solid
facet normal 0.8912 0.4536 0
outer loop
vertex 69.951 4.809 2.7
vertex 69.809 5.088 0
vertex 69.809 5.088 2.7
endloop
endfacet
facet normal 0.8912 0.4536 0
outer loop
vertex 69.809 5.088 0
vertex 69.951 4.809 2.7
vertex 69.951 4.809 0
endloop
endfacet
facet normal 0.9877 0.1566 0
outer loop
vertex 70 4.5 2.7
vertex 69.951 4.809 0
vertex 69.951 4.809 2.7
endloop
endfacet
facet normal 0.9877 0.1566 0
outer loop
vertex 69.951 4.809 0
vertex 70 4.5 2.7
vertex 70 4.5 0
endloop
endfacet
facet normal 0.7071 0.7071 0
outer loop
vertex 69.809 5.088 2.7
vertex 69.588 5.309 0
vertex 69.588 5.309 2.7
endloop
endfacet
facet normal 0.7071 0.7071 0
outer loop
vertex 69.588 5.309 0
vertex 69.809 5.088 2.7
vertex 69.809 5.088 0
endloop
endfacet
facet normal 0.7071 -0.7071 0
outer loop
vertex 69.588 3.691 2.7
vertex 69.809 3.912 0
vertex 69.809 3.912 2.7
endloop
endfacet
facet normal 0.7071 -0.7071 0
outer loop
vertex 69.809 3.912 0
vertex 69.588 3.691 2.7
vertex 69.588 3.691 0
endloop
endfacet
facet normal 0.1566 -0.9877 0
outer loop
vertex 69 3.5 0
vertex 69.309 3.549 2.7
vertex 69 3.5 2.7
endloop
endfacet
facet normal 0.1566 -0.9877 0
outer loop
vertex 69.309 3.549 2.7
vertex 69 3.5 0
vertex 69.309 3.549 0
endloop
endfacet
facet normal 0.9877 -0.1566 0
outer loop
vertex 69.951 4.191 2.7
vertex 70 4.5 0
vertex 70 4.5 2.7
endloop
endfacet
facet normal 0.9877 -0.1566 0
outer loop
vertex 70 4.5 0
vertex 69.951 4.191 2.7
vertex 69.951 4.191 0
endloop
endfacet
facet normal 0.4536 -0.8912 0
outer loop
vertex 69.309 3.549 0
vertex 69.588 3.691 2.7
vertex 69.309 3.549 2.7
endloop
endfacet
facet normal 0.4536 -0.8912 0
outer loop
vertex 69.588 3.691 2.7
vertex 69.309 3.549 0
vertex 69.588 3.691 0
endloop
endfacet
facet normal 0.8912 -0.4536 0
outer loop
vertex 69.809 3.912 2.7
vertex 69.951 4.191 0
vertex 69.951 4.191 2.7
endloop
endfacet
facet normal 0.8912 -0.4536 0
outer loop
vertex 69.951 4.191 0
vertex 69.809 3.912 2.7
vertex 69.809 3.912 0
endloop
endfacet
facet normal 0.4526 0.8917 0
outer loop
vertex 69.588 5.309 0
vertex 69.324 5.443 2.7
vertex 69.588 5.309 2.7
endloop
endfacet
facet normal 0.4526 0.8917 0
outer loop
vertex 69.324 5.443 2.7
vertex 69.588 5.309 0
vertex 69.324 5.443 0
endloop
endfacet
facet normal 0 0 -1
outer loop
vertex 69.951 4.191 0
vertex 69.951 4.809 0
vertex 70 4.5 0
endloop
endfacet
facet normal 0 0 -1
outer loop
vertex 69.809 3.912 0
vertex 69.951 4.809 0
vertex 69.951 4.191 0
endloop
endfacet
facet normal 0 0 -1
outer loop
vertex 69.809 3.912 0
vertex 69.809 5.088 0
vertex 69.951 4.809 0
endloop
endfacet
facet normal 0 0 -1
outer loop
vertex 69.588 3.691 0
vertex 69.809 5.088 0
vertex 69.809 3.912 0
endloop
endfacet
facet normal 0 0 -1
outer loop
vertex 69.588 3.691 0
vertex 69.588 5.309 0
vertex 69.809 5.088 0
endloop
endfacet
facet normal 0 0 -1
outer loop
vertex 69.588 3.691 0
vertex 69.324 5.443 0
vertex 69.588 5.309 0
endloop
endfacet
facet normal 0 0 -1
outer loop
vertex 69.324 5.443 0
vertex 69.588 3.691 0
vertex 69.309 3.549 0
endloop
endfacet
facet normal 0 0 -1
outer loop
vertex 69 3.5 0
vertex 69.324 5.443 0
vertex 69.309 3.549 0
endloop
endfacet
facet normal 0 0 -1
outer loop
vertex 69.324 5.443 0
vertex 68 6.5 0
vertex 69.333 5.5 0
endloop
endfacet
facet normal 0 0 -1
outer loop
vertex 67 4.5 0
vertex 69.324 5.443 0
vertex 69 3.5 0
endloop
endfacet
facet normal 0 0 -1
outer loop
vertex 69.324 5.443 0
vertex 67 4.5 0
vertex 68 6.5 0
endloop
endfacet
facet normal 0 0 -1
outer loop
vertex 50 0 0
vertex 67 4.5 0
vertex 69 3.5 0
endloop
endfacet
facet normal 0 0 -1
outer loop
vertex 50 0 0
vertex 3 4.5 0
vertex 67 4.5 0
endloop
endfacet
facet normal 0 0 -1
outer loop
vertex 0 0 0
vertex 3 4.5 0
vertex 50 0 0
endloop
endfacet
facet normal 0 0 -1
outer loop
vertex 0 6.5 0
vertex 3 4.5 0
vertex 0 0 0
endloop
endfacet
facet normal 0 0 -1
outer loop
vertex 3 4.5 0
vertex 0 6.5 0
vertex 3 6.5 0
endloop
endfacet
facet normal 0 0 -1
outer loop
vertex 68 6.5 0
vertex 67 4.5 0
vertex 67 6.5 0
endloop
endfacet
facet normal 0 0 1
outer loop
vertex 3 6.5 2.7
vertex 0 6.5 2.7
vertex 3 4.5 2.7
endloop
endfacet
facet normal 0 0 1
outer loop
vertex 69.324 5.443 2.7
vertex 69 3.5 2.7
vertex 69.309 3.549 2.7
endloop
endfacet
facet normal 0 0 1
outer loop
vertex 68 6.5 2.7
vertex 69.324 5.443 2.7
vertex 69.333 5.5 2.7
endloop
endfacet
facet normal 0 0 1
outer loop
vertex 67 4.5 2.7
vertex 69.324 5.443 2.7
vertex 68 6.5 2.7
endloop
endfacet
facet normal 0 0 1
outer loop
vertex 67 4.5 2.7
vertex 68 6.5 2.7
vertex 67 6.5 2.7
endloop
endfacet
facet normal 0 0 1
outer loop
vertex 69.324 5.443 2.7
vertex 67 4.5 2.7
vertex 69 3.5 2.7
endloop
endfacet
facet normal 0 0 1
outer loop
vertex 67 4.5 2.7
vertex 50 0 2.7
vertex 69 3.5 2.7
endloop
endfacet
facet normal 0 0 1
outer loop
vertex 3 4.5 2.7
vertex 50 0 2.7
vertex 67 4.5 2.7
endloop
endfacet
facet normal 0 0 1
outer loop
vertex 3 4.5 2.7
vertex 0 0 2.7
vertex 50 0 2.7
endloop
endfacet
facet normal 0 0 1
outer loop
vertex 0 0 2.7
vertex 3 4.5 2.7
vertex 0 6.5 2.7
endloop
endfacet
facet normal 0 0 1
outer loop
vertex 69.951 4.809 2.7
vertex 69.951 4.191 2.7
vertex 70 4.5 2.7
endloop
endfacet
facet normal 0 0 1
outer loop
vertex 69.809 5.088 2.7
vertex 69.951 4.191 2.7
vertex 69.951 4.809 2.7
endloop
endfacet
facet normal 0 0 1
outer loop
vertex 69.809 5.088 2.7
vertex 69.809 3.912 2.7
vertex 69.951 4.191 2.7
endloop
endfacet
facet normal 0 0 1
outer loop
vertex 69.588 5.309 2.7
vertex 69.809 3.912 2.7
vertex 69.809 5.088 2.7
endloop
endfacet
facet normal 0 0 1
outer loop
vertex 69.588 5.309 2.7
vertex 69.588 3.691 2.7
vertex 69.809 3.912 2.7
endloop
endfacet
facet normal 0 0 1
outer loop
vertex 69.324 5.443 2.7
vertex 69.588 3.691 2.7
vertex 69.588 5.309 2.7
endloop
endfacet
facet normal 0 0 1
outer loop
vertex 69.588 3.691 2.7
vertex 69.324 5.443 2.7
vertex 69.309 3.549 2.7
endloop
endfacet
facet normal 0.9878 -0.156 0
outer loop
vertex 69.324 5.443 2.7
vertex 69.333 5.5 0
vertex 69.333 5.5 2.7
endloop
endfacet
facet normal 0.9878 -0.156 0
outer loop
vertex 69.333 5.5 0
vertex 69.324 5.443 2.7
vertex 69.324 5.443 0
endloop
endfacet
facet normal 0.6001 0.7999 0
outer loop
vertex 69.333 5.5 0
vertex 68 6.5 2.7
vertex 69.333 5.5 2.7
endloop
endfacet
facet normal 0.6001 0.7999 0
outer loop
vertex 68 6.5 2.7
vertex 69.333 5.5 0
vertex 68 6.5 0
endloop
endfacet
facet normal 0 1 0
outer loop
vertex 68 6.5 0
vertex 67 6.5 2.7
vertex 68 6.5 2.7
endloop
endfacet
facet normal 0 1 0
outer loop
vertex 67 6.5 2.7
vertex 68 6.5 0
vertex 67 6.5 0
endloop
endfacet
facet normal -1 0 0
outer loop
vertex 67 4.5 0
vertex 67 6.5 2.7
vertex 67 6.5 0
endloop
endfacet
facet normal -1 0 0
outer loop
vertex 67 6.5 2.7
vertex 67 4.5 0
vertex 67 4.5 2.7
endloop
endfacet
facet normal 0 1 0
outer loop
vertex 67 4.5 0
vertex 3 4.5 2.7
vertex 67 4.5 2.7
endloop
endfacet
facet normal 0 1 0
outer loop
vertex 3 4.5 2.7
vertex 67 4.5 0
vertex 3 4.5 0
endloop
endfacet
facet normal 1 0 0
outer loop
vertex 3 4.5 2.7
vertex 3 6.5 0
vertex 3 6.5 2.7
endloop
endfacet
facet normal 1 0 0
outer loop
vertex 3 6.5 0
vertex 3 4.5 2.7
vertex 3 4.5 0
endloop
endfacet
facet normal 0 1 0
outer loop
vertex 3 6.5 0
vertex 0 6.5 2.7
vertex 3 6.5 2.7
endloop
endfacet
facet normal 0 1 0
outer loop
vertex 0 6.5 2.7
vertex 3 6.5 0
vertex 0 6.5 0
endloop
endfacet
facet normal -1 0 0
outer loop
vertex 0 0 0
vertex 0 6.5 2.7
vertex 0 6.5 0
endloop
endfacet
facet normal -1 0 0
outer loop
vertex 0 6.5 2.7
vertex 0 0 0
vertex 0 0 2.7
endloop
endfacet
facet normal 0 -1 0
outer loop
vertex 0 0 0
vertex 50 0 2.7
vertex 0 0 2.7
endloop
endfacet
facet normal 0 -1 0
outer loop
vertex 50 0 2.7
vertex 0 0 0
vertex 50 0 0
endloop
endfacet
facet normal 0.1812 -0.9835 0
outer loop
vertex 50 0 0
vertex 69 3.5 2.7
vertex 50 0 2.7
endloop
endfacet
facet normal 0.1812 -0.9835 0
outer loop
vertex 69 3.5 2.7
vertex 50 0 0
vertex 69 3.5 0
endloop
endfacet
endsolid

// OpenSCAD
il=64;  //internal length
oal=70;w=4.5;t=2.7;
lip=[3,2];  //length,ip
hook=[3,3.5,2];   //length, width, lip
taper=[19,2];   //length, root

//cube([oal-taper.x-hook.x,w,t]); //parallel section
//cube([lip.x,w+lip.y,t]);    //lip
//taper and hook section
translate([il+lip.x+hook.x-taper.y/2,taper.y/2+w-taper.y/2,0])cylinder(h=t,d=taper.y,$fn=20);
path=[[0,0],
[taper.x+hook.x-taper.y/2,w-taper.y],
[taper.x+hook.x-taper.y/2,w],
[taper.x-taper.y/2+1,w+hook.y/2],
[taper.x-taper.y/2,w+hook.y/2],
[taper.x-taper.y/2,w],
[0,w]
];
path2=[
[0,0],
[0,w+lip.y],
[lip.x,w+lip.y],
[lip.x,w],
[lip.x+il,w],
[lip.x+il,w+lip.y],
[lip.x+il+1,w+lip.y],
[lip.x+il+1+taper.y/1.5,w+taper.y/2],
[lip.x+il+1+taper.y/2,w-taper.y/2],
[lip.x+il+1+taper.y/2-taper.x,0]
];
linear_extrude(t)polygon(path2);
